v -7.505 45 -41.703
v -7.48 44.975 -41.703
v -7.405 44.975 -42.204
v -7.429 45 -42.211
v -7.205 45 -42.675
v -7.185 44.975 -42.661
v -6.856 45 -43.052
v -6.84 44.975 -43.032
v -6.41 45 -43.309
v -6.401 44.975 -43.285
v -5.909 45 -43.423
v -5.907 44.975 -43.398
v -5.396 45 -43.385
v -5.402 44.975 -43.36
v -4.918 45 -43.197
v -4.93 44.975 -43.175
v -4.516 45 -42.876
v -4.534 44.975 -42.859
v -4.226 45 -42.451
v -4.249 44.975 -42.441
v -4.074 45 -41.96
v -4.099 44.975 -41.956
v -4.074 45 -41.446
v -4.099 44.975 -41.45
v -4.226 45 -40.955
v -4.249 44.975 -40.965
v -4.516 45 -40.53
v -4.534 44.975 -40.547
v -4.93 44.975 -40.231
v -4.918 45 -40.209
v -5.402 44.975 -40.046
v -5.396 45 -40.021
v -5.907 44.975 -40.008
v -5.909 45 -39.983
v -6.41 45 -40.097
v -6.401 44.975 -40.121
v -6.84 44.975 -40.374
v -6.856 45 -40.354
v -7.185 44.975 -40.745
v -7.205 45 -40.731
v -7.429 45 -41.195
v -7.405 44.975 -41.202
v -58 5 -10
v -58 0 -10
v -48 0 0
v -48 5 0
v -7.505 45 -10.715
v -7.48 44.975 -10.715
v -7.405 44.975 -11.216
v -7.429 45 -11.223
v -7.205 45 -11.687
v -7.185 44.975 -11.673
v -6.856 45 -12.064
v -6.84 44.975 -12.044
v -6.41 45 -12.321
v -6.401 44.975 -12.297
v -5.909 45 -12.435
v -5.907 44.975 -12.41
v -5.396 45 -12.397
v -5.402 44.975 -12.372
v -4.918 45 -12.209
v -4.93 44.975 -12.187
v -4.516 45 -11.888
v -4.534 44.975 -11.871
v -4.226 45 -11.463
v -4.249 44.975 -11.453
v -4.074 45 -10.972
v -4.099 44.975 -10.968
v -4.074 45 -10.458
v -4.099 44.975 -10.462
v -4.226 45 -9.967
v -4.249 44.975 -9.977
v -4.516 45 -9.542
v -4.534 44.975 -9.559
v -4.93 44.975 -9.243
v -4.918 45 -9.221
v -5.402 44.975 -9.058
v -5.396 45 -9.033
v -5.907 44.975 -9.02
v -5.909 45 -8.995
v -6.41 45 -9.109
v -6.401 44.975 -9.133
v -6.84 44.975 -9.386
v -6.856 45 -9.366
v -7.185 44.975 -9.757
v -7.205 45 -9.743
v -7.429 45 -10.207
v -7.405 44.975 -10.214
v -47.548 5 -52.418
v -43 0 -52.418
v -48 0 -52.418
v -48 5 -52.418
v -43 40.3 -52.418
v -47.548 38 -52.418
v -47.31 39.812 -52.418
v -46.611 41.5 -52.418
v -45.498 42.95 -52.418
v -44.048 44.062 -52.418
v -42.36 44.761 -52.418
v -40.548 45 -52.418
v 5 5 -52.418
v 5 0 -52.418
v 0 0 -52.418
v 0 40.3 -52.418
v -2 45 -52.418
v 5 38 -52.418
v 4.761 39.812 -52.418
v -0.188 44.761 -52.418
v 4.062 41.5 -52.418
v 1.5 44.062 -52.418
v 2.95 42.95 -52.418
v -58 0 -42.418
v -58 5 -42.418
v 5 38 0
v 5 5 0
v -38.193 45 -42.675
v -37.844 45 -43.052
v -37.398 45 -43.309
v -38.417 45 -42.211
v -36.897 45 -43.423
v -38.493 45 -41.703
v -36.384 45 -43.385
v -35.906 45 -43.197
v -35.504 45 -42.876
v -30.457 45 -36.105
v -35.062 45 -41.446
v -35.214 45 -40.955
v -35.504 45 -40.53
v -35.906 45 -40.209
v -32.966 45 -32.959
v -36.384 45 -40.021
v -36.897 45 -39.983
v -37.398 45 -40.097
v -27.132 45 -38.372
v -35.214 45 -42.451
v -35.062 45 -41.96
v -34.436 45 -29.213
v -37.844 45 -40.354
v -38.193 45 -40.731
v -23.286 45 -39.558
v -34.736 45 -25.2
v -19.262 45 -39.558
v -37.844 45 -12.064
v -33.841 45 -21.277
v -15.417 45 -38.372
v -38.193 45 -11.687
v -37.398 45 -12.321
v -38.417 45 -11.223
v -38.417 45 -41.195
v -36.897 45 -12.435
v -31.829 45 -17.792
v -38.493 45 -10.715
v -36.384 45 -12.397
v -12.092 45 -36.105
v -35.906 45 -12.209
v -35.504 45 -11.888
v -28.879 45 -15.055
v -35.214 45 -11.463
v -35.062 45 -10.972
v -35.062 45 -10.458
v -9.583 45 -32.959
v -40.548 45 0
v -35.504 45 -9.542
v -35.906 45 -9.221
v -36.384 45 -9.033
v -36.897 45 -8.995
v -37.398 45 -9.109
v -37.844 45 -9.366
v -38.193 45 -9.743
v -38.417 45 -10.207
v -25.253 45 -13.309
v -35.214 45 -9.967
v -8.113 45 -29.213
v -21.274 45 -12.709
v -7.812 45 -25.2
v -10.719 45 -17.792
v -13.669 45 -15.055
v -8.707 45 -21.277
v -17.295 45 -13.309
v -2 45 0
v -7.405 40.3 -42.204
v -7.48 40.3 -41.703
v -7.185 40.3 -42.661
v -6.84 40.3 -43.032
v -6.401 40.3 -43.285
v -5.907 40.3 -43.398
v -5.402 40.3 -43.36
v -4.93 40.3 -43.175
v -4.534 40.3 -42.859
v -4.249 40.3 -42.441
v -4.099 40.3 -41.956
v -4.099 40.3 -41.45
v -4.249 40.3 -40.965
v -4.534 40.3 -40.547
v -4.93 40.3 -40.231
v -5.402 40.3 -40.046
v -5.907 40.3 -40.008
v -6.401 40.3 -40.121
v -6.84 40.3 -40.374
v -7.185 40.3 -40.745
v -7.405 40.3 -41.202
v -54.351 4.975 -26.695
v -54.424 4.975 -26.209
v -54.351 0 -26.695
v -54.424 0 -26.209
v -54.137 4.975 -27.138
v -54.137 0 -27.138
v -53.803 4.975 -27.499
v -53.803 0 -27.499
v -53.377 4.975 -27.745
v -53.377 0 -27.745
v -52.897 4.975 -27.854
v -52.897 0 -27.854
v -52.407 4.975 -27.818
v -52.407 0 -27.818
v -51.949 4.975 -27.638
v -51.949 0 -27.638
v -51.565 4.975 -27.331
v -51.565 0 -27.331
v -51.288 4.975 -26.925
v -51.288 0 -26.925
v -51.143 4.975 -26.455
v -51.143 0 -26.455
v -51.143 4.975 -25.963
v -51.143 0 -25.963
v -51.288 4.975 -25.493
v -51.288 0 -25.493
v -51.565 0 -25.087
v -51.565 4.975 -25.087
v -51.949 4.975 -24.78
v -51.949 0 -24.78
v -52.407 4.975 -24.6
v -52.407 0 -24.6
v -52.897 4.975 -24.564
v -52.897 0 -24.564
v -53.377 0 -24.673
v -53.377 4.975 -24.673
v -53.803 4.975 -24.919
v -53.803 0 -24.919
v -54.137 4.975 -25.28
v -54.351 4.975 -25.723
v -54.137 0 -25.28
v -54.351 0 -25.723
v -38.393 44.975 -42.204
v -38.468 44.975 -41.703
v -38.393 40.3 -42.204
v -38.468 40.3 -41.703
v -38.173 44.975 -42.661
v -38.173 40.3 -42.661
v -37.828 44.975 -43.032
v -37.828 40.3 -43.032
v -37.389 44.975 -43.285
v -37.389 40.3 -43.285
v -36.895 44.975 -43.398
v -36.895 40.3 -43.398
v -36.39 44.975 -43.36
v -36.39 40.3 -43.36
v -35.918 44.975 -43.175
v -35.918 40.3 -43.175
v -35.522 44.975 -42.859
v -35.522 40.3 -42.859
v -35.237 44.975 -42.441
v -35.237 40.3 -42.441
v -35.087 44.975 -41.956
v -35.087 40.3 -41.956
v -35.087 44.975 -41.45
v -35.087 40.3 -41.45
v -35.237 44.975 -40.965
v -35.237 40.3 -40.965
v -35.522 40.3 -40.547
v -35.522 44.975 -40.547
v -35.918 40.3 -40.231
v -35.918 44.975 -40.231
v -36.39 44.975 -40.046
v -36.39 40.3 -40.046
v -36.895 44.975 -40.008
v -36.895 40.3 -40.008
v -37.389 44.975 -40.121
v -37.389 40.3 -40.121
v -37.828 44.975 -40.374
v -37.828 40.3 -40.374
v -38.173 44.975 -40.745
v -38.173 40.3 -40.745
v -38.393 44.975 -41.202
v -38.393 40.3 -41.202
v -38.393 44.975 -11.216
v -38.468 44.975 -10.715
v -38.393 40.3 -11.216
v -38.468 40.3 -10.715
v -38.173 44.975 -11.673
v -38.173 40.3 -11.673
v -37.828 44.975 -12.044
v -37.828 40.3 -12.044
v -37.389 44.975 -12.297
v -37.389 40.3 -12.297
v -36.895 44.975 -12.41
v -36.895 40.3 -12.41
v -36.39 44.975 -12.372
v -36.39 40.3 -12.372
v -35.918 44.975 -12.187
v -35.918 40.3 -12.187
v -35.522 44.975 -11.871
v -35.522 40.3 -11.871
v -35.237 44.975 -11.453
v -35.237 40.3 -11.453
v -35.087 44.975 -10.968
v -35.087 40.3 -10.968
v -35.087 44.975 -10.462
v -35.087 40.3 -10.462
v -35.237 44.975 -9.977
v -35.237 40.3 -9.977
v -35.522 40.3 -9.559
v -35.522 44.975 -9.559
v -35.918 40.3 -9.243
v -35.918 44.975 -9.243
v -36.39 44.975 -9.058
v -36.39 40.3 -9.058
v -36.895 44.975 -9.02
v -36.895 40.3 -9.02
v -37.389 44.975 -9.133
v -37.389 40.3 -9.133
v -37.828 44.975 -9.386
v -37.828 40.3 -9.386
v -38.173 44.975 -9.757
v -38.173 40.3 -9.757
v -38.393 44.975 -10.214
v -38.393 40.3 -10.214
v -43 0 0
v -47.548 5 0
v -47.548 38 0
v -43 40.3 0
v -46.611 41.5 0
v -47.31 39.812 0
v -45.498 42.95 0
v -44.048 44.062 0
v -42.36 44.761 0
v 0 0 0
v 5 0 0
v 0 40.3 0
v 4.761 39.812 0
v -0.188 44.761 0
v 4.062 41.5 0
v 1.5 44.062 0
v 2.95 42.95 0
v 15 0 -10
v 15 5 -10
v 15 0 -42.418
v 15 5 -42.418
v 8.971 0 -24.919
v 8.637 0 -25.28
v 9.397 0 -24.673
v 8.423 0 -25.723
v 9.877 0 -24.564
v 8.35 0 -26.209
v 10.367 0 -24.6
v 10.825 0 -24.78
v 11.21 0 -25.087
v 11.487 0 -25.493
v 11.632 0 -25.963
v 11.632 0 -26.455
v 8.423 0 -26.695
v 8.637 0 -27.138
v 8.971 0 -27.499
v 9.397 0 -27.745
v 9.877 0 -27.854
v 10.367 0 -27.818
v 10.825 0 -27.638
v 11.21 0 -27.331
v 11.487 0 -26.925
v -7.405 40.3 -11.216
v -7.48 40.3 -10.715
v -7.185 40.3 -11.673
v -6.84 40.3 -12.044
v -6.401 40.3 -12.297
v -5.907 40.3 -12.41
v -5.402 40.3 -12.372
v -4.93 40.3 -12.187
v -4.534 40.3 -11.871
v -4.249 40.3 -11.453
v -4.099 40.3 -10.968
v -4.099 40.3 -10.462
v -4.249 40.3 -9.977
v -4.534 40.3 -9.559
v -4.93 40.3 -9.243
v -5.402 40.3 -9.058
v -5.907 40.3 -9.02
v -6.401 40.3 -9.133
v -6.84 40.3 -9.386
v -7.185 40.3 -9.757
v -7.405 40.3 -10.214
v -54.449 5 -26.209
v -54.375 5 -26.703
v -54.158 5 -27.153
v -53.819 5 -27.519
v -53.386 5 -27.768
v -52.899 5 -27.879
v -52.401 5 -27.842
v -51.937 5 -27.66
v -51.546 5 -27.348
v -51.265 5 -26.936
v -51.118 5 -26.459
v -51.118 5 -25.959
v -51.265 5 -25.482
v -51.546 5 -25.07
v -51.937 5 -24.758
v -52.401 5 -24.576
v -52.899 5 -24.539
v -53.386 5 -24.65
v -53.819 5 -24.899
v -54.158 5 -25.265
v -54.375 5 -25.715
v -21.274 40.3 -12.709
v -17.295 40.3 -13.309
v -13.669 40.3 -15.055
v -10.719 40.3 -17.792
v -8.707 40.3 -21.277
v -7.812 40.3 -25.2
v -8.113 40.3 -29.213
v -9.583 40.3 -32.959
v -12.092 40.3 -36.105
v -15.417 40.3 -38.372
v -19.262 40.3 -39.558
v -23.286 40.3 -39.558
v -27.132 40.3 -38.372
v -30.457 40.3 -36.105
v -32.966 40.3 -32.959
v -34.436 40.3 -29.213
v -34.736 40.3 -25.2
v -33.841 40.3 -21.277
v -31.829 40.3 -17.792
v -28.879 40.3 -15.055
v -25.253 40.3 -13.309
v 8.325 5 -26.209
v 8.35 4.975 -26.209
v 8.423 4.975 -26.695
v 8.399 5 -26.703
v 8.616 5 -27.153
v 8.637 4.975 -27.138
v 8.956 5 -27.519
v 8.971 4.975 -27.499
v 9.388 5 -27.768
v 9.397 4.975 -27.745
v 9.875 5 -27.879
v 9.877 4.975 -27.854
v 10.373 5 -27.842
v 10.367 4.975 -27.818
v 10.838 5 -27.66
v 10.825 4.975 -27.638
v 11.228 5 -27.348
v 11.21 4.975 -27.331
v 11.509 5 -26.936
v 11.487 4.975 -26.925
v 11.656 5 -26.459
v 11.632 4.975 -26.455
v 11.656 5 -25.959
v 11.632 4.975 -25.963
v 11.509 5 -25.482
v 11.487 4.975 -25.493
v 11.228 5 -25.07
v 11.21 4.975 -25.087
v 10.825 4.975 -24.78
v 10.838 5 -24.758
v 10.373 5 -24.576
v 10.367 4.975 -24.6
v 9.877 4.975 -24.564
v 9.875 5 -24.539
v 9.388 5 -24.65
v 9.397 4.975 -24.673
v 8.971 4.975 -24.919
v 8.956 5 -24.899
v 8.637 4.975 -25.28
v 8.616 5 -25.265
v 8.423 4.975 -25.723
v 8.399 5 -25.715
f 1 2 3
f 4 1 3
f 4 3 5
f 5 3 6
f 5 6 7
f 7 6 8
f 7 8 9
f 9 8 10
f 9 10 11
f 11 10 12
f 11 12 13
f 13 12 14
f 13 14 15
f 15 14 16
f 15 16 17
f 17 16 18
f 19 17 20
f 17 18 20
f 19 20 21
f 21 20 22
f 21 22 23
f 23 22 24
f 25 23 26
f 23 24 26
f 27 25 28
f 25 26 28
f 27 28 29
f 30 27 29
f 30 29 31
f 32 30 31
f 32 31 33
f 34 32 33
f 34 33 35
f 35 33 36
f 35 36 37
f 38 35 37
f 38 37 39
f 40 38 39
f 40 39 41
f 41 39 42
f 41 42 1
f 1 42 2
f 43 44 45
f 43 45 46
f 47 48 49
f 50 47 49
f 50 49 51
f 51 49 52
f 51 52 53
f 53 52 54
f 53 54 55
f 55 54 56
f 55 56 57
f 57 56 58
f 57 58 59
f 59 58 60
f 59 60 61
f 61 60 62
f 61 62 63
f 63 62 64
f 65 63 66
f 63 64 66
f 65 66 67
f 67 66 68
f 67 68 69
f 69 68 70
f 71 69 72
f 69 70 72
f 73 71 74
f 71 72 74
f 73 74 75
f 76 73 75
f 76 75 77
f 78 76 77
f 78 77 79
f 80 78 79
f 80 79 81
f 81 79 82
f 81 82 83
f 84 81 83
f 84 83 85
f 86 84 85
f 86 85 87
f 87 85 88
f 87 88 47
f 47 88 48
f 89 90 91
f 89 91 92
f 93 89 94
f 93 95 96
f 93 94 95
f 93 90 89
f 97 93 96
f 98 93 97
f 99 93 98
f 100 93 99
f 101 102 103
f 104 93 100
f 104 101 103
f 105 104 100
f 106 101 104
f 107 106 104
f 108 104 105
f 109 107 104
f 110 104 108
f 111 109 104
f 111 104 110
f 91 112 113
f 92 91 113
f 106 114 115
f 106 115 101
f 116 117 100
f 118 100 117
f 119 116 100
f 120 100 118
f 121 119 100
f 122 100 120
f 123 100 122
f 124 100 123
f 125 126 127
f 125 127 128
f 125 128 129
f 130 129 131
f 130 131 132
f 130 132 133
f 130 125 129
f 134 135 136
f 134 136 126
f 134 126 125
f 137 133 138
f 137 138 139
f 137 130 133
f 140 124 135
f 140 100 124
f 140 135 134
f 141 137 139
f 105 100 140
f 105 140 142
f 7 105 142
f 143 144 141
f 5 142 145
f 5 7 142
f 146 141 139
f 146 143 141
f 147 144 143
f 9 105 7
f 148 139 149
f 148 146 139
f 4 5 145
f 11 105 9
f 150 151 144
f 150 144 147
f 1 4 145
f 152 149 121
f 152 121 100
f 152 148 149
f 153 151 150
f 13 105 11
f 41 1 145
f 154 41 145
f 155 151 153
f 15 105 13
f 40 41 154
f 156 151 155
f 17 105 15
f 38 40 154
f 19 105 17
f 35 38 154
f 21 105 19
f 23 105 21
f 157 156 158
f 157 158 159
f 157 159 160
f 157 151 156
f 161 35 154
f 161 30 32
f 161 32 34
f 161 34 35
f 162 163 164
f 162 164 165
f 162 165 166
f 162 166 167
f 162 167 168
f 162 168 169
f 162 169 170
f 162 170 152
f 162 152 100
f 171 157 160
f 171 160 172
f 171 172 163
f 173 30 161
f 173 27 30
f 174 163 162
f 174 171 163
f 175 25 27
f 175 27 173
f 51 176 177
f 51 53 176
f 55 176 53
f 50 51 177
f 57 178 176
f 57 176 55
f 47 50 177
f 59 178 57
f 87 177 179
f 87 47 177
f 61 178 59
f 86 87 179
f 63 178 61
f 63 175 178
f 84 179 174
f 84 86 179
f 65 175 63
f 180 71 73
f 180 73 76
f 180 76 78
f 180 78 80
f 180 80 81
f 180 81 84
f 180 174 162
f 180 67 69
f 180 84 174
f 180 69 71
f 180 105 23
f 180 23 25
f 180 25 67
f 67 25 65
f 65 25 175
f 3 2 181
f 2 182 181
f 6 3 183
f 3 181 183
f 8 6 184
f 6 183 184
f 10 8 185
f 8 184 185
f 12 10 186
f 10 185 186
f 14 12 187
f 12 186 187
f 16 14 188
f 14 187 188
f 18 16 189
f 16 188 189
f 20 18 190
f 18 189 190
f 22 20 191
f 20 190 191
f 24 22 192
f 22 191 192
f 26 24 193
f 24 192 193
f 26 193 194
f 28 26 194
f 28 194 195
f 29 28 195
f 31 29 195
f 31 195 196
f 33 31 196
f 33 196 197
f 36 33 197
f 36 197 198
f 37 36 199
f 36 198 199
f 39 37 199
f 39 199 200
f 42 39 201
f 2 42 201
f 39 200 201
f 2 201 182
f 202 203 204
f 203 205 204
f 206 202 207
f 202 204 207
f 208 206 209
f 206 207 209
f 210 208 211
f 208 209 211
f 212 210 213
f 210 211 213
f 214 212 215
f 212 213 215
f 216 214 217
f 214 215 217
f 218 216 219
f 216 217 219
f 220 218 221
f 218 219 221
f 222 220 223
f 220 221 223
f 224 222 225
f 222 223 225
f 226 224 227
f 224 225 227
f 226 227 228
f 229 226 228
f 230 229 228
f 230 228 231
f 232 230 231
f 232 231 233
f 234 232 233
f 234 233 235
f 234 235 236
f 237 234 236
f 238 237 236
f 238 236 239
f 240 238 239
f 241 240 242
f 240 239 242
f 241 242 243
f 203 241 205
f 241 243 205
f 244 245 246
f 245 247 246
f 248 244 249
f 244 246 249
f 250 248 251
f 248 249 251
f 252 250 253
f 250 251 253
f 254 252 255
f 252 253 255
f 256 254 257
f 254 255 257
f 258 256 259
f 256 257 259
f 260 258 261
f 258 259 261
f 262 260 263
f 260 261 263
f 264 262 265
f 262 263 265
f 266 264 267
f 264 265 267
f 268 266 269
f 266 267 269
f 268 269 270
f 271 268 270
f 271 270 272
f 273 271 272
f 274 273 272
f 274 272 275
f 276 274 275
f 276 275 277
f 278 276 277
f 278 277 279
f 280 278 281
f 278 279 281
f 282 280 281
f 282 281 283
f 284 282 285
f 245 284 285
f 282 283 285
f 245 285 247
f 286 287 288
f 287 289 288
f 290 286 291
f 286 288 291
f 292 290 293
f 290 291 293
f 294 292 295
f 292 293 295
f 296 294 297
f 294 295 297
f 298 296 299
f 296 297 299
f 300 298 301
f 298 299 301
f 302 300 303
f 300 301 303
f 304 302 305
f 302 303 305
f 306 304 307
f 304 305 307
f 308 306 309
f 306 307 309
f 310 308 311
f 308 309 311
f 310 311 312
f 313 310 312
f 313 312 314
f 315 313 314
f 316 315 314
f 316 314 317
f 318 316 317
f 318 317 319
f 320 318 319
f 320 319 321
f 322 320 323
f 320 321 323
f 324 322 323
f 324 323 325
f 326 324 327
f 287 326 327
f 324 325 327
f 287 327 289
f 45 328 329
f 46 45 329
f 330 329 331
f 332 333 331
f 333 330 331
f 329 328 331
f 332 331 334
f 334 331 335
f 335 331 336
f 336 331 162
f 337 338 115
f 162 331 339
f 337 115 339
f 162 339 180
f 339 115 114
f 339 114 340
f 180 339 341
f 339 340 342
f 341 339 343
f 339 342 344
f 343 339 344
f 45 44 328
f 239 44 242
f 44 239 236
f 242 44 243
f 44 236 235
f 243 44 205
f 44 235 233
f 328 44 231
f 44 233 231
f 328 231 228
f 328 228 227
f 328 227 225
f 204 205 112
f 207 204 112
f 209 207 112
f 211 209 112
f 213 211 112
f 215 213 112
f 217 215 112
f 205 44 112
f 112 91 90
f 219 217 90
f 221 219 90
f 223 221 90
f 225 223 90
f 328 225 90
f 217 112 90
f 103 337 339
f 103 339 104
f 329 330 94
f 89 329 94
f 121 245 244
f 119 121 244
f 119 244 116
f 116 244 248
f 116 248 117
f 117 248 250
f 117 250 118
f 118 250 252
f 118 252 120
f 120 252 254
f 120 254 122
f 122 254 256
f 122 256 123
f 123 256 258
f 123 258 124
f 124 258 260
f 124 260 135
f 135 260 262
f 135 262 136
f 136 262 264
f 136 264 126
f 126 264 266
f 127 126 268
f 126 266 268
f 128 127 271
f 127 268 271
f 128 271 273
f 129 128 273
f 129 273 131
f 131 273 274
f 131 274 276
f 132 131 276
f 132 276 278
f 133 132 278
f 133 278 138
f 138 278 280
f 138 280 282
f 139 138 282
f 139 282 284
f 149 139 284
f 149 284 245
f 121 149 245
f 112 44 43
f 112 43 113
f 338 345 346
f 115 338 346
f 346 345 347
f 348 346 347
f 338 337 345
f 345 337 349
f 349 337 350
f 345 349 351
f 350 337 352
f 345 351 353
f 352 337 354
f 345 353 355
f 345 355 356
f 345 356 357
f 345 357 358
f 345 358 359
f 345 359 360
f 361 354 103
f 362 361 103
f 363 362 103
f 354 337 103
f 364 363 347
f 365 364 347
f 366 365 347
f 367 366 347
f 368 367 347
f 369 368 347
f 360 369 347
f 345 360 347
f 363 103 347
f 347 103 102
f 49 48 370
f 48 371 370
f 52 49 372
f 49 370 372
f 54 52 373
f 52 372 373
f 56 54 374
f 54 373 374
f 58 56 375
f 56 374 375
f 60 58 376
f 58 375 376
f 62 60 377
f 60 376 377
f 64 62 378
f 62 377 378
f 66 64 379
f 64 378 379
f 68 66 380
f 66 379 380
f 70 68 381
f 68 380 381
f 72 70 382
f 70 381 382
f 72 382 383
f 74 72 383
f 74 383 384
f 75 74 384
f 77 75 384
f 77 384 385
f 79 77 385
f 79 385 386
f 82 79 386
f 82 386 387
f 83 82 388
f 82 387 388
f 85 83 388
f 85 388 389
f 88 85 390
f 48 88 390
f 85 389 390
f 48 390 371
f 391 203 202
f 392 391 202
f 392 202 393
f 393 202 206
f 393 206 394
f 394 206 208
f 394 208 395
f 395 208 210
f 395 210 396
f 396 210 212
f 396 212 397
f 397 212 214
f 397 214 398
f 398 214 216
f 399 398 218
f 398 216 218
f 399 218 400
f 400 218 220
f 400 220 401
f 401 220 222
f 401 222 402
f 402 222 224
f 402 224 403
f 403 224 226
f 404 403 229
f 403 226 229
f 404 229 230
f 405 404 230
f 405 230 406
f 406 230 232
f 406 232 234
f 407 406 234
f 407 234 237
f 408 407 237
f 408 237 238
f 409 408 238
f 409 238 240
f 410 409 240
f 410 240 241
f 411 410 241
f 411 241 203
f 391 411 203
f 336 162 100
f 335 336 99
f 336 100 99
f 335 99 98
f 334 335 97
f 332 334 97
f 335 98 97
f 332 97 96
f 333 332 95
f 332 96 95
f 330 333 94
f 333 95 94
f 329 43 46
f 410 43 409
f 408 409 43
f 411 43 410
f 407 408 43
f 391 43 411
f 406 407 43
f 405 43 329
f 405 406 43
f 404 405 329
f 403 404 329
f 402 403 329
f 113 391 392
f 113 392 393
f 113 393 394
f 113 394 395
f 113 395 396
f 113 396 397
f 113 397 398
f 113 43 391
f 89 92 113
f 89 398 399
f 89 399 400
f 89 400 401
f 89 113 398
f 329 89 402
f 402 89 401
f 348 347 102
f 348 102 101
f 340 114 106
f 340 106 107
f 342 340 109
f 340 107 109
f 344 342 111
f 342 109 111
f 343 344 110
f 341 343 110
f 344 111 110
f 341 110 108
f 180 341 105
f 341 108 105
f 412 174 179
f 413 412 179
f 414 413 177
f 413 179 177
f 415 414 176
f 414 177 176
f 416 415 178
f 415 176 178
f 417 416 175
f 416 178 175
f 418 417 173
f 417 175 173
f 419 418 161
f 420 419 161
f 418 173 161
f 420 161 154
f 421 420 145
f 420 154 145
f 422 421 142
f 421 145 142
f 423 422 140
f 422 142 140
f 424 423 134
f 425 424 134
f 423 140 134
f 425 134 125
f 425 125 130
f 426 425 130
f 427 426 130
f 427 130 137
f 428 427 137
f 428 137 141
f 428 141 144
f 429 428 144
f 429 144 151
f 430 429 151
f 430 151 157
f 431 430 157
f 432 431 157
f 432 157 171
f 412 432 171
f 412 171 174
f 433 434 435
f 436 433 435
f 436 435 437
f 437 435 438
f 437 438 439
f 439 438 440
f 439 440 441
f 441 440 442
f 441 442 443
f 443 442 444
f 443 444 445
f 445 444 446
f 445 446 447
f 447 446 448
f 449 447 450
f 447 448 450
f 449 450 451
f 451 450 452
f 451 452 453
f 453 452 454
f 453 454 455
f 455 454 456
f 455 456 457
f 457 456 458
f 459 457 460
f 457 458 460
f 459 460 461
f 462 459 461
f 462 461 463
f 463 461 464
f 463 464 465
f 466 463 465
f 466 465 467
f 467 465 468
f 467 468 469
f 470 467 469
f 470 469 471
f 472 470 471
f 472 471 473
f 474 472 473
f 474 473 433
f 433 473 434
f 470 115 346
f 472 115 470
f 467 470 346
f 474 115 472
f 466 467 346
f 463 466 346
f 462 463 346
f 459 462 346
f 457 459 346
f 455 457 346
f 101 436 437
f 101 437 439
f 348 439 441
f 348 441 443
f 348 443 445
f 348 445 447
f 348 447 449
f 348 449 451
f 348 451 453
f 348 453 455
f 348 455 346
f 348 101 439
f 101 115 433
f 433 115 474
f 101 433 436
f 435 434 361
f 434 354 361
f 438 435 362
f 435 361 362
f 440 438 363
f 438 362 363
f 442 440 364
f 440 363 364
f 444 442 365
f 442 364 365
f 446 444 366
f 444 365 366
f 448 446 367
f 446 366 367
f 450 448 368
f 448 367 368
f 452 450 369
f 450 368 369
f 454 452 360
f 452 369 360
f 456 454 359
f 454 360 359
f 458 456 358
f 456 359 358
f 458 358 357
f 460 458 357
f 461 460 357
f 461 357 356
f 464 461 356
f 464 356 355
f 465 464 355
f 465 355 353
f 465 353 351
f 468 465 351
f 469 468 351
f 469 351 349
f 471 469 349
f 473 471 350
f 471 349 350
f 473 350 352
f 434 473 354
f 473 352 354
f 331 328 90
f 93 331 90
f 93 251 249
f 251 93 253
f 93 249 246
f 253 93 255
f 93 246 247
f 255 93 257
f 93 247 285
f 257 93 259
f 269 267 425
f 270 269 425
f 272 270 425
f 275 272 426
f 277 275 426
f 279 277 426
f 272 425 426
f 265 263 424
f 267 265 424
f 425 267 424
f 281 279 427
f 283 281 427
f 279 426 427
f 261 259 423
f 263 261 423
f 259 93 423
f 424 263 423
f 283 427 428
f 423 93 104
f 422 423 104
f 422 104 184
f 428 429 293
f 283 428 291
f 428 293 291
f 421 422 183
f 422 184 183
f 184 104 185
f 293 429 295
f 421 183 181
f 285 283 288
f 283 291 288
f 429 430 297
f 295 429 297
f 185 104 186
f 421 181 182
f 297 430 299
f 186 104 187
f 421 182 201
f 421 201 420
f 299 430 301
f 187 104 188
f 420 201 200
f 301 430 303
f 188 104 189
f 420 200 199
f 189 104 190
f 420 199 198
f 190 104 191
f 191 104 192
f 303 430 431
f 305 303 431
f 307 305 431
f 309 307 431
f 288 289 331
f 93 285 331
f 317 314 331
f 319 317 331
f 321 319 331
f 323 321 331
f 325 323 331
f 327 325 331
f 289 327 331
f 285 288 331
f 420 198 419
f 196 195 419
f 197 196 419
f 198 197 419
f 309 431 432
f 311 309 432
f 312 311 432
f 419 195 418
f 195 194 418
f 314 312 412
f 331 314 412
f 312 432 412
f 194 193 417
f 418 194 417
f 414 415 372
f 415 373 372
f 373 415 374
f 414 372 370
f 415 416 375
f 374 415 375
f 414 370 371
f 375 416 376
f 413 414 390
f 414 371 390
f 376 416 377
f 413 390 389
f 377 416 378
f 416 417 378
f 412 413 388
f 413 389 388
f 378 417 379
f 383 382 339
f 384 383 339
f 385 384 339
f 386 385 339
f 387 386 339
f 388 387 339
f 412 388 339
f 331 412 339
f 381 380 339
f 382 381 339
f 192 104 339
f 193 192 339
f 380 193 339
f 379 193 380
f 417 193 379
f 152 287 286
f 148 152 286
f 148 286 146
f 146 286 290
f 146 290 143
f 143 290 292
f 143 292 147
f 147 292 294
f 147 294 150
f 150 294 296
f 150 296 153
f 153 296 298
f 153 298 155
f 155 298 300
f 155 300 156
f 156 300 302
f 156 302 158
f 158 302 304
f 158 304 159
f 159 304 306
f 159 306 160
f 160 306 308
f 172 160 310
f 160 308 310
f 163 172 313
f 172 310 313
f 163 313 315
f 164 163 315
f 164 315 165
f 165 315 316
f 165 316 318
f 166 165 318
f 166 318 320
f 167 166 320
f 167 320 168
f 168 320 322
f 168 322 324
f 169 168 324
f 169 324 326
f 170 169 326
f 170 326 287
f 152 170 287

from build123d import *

# Parameters (mm, degrees)
SKETCH1_W                             = 15
SKETCH1_H                             = 52.418
BOSS_EXTRUDE1_DEPTH                   = 45
BOSS_EXTRUDE1_2_DEPTH                 = 45
SKETCH2_W                             = 10.451630362
SKETCH2_H                             = 52.418
SKETCH2_W_2                           = 10
CUT_EXTRUDE1_DEPTH                    = 40
SKETCH3_W                             = 52.418
SKETCH3_H                             = 4.7
BOSS_EXTRUDE3_DEPTH                   = 44
M3_CLEARANCE_HOLE1_D                  = 3.4
M3_CLEARANCE_HOLE1_CSINK_D            = 3.45
M3_CLEARANCE_HOLE1_CSINK_ANGLE        = 90
SKETCH4_R                             = 13.5
CUT_EXTRUDE2_DEPTH                    = 44
TAP_DRILL_FOR_M4X0_7_TAP1_D           = 3.3
TAP_DRILL_FOR_M4X0_7_TAP1_CSINK_D     = 3.35
TAP_DRILL_FOR_M4X0_7_TAP1_CSINK_ANGLE = 90
CHAMFER1_SIZE                         = 10
FILLET1_R                             = 7


with BuildPart() as part:
    # Sketch1 → Boss-Extrude1 (new body)
    with BuildSketch(Plane(origin=(0, 0, 0), x_dir=(1, 0, 0), z_dir=(0, 1, 0))):
        with Locations((7.5, 26.209)):
            Rectangle(SKETCH1_W, SKETCH1_H)
    extrude(amount=BOSS_EXTRUDE1_DEPTH)


with BuildPart() as body_2:
    # Sketch1 → Boss-Extrude1 2 (new body)
    with BuildSketch(Plane(origin=(0, 0, 0), x_dir=(1, 0, 0), z_dir=(0, 1, 0))):
        with Locations((-50.5, 26.209)):
            Rectangle(SKETCH1_W, SKETCH1_H)
    extrude(amount=BOSS_EXTRUDE1_2_DEPTH)


with BuildPart() as cut_extrude1_tool:
    # Sketch2 → Cut-Extrude1 (new body)
    with BuildSketch(Plane(origin=(0, 45, 0), x_dir=(1, 0, 0), z_dir=(0, 1, 0))):
        with Locations((-52.774184819, 26.209)):
            Rectangle(SKETCH2_W, SKETCH2_H)
        with Locations((10, 26.209)):
            Rectangle(SKETCH2_W_2, SKETCH2_H)
    extrude(amount=-CUT_EXTRUDE1_DEPTH)


with BuildPart() as part_1:
    add(part.part)

    # Cut-Extrude1: cut by cut_extrude1_tool
    add(cut_extrude1_tool.part, mode=Mode.SUBTRACT)



with BuildPart() as body_2_1:
    add(body_2.part)

    # Cut-Extrude1: cut by cut_extrude1_tool
    add(cut_extrude1_tool.part, mode=Mode.SUBTRACT)


with BuildPart() as part_2:
    add(part_1.part)

    add(body_2_1.part)  # Boss-Extrude3 merges body 2
    # Sketch3 → Boss-Extrude3 (add)
    with BuildSketch(Plane.ZY):
        with Locations((-26.209, 42.65)):
            Rectangle(SKETCH3_W, SKETCH3_H)
    extrude(amount=BOSS_EXTRUDE3_DEPTH)

    # M3 Clearance Hole1 (through all)
    with Locations(Plane(origin=(0, 45, 0), x_dir=(1, 0, 0), z_dir=(0, 1, 0))):
        with Locations((-36.768184819, 41.703), (-5.780184819, 41.703), (-5.780184819, 10.715), (-36.768184819, 10.715)):
            CounterSinkHole(M3_CLEARANCE_HOLE1_D / 2, M3_CLEARANCE_HOLE1_CSINK_D / 2, counter_sink_angle=M3_CLEARANCE_HOLE1_CSINK_ANGLE)

    # Sketch4 → Cut-Extrude2 (cut)
    with BuildSketch(Plane(origin=(0, 45, 0), x_dir=(1, 0, 0), z_dir=(0, 1, 0))):
        with Locations(Location((-21.274184819, 26.209, 0), (0, 0, 270))):
            Circle(SKETCH4_R)
    extrude(amount=-CUT_EXTRUDE2_DEPTH, mode=Mode.SUBTRACT)

    # Tap Drill for M4x0.7 Tap1 (through all)
    with Locations(Plane(origin=(0, 5, 0), x_dir=(1, 0, 0), z_dir=(0, 1, 0))):
        with Locations((-52.774184819, 26.209), (10, 26.209)):
            CounterSinkHole(TAP_DRILL_FOR_M4X0_7_TAP1_D / 2, TAP_DRILL_FOR_M4X0_7_TAP1_CSINK_D / 2, counter_sink_angle=TAP_DRILL_FOR_M4X0_7_TAP1_CSINK_ANGLE)

    # Chamfer1
    chamfer1_edges = [part_2.edges().sort_by_distance(p)[0] for p in [
        (15, 2.5, -52.418),
        (15, 2.5, 0),
        (-58, 2.5, 0),
        (-58, 2.5, -52.418),
    ]]
    chamfer(chamfer1_edges, length=CHAMFER1_SIZE)

    # Fillet1
    fillet1_edges = [part_2.edges().sort_by_distance(p)[0] for p in [
        (5, 45, -26.209),
        (-47.548369638, 45, -26.209),
    ]]
    fillet(fillet1_edges, radius=FILLET1_R)


solid = part_2.part
